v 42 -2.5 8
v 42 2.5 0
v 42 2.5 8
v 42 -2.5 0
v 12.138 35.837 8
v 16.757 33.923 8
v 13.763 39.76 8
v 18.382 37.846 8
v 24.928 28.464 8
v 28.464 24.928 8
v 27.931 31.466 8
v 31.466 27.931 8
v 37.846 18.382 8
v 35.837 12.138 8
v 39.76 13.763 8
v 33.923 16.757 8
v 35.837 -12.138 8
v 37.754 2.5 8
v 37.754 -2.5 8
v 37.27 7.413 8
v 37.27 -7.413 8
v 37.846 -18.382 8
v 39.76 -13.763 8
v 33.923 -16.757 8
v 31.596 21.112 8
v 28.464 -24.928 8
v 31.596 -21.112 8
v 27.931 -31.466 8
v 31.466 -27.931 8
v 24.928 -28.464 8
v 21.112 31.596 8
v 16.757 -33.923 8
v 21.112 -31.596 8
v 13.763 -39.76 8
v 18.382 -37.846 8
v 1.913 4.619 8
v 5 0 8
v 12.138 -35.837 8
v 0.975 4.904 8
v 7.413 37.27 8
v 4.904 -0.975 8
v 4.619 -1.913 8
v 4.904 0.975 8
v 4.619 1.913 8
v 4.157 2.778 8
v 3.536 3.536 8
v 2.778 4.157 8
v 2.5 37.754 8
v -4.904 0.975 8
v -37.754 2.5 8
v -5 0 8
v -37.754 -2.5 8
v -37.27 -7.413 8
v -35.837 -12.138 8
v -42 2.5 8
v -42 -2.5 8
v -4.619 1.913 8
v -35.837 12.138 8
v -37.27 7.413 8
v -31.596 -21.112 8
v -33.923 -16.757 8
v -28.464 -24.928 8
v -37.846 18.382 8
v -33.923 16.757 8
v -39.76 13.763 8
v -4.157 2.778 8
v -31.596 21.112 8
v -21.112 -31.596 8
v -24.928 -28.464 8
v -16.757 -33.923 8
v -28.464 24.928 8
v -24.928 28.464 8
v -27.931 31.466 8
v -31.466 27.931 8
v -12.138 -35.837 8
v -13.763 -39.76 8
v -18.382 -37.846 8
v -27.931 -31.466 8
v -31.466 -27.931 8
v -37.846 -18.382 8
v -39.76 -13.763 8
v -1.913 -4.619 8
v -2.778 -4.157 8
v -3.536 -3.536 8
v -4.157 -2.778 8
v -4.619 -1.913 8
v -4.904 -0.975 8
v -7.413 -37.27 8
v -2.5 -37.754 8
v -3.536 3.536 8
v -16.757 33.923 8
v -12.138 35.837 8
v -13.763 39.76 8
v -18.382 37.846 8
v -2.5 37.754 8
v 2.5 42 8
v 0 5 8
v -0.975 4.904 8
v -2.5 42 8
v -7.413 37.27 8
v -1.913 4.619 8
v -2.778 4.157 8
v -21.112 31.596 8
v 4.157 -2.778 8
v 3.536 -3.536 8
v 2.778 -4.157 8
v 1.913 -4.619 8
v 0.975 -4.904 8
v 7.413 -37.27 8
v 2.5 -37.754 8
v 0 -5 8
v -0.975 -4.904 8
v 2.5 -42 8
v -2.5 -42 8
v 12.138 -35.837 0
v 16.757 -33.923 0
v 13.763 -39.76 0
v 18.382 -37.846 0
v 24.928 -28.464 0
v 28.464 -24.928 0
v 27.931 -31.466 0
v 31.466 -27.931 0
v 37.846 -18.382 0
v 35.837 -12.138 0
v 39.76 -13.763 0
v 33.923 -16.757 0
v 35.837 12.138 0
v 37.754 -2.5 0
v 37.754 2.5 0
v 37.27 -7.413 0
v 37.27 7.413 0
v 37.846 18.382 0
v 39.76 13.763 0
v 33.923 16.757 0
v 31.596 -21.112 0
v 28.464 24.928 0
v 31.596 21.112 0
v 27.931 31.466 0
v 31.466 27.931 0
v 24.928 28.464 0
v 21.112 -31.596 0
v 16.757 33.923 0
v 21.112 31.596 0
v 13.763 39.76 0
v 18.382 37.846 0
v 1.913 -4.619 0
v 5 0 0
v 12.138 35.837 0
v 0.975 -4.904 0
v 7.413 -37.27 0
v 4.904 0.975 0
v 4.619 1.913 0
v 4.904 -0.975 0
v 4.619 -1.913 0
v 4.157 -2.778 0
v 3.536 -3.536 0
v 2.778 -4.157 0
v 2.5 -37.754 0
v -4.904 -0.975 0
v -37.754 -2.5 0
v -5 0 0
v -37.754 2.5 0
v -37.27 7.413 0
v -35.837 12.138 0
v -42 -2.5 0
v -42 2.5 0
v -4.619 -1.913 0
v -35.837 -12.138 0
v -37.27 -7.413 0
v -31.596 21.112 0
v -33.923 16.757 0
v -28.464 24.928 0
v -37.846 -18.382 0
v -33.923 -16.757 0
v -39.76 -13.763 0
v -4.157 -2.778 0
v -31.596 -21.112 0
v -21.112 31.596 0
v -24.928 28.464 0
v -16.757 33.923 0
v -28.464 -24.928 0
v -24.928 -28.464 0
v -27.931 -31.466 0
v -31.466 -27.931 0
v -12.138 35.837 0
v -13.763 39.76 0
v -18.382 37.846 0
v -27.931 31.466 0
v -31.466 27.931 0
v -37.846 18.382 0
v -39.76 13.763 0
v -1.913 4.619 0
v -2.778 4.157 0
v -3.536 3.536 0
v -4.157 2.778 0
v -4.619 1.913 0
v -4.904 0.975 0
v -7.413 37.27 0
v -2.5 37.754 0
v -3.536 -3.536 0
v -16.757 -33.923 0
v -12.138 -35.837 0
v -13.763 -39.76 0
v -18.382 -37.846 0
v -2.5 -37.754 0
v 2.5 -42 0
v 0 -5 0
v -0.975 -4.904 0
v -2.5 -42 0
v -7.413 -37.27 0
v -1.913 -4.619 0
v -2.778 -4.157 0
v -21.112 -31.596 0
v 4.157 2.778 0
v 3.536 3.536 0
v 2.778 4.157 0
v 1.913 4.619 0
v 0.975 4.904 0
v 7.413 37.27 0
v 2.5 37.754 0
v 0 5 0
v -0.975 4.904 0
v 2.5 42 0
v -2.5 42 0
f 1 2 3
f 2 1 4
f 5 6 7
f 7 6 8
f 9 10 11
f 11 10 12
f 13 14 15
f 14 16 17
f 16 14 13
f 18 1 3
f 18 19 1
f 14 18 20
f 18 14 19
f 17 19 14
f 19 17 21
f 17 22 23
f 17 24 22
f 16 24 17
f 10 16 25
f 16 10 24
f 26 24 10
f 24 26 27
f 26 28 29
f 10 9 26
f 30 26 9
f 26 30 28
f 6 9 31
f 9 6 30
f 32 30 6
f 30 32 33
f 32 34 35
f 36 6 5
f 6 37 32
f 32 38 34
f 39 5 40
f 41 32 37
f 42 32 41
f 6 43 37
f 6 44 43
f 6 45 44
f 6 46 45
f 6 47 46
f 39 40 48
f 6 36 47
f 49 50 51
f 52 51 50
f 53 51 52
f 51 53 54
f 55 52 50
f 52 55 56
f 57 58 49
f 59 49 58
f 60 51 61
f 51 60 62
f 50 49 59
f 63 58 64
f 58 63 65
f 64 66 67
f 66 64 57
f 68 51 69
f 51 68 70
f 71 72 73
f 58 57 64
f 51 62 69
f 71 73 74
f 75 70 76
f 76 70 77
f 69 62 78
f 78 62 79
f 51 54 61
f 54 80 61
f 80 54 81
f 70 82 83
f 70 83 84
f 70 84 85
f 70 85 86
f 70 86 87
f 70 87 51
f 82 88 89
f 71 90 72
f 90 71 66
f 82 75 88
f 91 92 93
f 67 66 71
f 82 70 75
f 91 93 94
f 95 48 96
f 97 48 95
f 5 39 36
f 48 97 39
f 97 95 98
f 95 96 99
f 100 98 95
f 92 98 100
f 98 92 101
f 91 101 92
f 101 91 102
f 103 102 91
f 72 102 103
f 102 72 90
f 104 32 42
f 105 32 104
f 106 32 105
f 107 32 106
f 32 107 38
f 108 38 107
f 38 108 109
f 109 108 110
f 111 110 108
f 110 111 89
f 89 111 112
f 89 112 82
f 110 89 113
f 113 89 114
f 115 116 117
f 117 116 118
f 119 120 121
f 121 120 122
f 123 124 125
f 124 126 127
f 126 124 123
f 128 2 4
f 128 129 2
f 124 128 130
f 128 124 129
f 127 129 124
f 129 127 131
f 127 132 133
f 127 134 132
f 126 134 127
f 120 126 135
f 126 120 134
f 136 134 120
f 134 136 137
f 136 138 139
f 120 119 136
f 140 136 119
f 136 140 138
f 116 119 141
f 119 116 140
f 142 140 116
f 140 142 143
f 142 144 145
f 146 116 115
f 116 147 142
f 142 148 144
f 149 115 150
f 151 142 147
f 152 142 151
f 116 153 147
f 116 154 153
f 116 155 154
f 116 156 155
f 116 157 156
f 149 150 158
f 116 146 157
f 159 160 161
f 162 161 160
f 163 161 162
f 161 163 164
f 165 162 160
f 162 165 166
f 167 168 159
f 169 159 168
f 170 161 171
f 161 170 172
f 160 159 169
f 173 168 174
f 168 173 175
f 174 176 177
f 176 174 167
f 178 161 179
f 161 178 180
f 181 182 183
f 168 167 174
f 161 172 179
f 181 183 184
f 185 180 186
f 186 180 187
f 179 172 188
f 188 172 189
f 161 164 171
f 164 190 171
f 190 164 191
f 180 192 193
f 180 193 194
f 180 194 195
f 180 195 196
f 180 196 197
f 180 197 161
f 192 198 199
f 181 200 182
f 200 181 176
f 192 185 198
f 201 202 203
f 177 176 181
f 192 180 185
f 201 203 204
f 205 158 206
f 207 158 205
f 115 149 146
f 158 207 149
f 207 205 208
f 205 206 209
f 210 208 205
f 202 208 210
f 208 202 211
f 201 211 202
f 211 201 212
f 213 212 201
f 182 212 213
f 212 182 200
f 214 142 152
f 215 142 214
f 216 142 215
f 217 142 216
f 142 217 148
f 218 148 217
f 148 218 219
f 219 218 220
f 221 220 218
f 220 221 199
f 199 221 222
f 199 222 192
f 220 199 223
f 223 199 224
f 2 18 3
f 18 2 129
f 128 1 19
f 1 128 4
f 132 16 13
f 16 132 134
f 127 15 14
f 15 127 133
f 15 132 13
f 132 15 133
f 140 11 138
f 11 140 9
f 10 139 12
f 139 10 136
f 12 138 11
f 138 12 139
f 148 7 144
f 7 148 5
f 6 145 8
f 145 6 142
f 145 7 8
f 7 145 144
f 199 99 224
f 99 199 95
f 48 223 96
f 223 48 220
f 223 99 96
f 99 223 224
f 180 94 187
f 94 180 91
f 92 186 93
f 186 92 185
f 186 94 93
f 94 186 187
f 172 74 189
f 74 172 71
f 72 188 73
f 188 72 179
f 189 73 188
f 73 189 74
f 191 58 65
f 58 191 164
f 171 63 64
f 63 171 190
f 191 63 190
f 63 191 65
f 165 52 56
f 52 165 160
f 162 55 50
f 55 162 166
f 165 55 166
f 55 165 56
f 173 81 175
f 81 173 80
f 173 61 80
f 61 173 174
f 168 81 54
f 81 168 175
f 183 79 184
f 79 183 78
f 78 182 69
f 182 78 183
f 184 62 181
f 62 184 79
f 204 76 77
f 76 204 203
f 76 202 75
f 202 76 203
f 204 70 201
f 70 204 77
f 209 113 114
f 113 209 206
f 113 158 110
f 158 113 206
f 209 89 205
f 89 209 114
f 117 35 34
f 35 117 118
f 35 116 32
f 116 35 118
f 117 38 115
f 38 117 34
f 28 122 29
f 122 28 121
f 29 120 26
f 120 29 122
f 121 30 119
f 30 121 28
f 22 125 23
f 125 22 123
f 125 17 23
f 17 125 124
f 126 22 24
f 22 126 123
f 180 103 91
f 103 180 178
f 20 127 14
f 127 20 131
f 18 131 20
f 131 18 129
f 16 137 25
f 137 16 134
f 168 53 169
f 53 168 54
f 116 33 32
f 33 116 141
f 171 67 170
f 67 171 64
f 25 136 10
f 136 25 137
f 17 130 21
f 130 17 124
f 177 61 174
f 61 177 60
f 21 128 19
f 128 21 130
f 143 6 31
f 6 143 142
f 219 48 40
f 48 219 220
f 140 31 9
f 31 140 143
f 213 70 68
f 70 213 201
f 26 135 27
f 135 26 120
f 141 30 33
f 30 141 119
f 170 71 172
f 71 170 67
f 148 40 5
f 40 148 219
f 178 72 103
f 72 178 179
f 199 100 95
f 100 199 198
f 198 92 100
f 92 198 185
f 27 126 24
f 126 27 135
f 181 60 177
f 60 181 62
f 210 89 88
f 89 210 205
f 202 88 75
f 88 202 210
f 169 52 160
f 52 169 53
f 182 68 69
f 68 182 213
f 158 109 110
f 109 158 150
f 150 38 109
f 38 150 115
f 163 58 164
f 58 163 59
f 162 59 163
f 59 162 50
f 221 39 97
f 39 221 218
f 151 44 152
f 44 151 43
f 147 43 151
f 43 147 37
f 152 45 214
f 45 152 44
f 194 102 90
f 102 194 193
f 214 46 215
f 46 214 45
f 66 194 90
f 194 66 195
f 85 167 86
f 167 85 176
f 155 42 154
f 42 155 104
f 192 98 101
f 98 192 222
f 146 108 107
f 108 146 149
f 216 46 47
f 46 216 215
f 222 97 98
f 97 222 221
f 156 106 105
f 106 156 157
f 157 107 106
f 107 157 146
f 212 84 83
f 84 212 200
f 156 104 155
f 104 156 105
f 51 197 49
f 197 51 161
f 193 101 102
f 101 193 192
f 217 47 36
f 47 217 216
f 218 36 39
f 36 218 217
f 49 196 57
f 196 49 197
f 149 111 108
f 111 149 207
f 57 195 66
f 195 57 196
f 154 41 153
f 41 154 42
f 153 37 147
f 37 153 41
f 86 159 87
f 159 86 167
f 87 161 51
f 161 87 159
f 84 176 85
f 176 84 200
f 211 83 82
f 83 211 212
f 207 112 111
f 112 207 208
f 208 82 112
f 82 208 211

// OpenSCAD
$fn = 32;

// ----------------------------------------------------------------------
// Spur blank: bored gear blank
// ----------------------------------------------------------------------

// --- parameters (mm) ---
disc_r = 38;              // blank root radius
disc_t = 8;               // blank thickness
n_teeth = 16;             // stub tooth count
tooth_w = 5;              // tooth width at the root
tooth_h = 4;              // tooth height above the root
bore_r = 5;               // central bore radius

out_r = disc_r + tooth_h;  // tip radius
bbox_x = 84.0;  // measured width over the teeth
bbox_y = 84.0;  // measured depth over the teeth

difference() {
union() {
  cylinder(r = disc_r, h = disc_t);
  for (i = [0 : n_teeth - 1])
    rotate([0, 0, i * 360 / n_teeth])
      translate([disc_r - 1, -tooth_w / 2, 0])
        cube([tooth_h + 1, tooth_w, disc_t]);
}
  translate([0, 0, -1]) cylinder(r = bore_r, h = disc_t + 2);
}
